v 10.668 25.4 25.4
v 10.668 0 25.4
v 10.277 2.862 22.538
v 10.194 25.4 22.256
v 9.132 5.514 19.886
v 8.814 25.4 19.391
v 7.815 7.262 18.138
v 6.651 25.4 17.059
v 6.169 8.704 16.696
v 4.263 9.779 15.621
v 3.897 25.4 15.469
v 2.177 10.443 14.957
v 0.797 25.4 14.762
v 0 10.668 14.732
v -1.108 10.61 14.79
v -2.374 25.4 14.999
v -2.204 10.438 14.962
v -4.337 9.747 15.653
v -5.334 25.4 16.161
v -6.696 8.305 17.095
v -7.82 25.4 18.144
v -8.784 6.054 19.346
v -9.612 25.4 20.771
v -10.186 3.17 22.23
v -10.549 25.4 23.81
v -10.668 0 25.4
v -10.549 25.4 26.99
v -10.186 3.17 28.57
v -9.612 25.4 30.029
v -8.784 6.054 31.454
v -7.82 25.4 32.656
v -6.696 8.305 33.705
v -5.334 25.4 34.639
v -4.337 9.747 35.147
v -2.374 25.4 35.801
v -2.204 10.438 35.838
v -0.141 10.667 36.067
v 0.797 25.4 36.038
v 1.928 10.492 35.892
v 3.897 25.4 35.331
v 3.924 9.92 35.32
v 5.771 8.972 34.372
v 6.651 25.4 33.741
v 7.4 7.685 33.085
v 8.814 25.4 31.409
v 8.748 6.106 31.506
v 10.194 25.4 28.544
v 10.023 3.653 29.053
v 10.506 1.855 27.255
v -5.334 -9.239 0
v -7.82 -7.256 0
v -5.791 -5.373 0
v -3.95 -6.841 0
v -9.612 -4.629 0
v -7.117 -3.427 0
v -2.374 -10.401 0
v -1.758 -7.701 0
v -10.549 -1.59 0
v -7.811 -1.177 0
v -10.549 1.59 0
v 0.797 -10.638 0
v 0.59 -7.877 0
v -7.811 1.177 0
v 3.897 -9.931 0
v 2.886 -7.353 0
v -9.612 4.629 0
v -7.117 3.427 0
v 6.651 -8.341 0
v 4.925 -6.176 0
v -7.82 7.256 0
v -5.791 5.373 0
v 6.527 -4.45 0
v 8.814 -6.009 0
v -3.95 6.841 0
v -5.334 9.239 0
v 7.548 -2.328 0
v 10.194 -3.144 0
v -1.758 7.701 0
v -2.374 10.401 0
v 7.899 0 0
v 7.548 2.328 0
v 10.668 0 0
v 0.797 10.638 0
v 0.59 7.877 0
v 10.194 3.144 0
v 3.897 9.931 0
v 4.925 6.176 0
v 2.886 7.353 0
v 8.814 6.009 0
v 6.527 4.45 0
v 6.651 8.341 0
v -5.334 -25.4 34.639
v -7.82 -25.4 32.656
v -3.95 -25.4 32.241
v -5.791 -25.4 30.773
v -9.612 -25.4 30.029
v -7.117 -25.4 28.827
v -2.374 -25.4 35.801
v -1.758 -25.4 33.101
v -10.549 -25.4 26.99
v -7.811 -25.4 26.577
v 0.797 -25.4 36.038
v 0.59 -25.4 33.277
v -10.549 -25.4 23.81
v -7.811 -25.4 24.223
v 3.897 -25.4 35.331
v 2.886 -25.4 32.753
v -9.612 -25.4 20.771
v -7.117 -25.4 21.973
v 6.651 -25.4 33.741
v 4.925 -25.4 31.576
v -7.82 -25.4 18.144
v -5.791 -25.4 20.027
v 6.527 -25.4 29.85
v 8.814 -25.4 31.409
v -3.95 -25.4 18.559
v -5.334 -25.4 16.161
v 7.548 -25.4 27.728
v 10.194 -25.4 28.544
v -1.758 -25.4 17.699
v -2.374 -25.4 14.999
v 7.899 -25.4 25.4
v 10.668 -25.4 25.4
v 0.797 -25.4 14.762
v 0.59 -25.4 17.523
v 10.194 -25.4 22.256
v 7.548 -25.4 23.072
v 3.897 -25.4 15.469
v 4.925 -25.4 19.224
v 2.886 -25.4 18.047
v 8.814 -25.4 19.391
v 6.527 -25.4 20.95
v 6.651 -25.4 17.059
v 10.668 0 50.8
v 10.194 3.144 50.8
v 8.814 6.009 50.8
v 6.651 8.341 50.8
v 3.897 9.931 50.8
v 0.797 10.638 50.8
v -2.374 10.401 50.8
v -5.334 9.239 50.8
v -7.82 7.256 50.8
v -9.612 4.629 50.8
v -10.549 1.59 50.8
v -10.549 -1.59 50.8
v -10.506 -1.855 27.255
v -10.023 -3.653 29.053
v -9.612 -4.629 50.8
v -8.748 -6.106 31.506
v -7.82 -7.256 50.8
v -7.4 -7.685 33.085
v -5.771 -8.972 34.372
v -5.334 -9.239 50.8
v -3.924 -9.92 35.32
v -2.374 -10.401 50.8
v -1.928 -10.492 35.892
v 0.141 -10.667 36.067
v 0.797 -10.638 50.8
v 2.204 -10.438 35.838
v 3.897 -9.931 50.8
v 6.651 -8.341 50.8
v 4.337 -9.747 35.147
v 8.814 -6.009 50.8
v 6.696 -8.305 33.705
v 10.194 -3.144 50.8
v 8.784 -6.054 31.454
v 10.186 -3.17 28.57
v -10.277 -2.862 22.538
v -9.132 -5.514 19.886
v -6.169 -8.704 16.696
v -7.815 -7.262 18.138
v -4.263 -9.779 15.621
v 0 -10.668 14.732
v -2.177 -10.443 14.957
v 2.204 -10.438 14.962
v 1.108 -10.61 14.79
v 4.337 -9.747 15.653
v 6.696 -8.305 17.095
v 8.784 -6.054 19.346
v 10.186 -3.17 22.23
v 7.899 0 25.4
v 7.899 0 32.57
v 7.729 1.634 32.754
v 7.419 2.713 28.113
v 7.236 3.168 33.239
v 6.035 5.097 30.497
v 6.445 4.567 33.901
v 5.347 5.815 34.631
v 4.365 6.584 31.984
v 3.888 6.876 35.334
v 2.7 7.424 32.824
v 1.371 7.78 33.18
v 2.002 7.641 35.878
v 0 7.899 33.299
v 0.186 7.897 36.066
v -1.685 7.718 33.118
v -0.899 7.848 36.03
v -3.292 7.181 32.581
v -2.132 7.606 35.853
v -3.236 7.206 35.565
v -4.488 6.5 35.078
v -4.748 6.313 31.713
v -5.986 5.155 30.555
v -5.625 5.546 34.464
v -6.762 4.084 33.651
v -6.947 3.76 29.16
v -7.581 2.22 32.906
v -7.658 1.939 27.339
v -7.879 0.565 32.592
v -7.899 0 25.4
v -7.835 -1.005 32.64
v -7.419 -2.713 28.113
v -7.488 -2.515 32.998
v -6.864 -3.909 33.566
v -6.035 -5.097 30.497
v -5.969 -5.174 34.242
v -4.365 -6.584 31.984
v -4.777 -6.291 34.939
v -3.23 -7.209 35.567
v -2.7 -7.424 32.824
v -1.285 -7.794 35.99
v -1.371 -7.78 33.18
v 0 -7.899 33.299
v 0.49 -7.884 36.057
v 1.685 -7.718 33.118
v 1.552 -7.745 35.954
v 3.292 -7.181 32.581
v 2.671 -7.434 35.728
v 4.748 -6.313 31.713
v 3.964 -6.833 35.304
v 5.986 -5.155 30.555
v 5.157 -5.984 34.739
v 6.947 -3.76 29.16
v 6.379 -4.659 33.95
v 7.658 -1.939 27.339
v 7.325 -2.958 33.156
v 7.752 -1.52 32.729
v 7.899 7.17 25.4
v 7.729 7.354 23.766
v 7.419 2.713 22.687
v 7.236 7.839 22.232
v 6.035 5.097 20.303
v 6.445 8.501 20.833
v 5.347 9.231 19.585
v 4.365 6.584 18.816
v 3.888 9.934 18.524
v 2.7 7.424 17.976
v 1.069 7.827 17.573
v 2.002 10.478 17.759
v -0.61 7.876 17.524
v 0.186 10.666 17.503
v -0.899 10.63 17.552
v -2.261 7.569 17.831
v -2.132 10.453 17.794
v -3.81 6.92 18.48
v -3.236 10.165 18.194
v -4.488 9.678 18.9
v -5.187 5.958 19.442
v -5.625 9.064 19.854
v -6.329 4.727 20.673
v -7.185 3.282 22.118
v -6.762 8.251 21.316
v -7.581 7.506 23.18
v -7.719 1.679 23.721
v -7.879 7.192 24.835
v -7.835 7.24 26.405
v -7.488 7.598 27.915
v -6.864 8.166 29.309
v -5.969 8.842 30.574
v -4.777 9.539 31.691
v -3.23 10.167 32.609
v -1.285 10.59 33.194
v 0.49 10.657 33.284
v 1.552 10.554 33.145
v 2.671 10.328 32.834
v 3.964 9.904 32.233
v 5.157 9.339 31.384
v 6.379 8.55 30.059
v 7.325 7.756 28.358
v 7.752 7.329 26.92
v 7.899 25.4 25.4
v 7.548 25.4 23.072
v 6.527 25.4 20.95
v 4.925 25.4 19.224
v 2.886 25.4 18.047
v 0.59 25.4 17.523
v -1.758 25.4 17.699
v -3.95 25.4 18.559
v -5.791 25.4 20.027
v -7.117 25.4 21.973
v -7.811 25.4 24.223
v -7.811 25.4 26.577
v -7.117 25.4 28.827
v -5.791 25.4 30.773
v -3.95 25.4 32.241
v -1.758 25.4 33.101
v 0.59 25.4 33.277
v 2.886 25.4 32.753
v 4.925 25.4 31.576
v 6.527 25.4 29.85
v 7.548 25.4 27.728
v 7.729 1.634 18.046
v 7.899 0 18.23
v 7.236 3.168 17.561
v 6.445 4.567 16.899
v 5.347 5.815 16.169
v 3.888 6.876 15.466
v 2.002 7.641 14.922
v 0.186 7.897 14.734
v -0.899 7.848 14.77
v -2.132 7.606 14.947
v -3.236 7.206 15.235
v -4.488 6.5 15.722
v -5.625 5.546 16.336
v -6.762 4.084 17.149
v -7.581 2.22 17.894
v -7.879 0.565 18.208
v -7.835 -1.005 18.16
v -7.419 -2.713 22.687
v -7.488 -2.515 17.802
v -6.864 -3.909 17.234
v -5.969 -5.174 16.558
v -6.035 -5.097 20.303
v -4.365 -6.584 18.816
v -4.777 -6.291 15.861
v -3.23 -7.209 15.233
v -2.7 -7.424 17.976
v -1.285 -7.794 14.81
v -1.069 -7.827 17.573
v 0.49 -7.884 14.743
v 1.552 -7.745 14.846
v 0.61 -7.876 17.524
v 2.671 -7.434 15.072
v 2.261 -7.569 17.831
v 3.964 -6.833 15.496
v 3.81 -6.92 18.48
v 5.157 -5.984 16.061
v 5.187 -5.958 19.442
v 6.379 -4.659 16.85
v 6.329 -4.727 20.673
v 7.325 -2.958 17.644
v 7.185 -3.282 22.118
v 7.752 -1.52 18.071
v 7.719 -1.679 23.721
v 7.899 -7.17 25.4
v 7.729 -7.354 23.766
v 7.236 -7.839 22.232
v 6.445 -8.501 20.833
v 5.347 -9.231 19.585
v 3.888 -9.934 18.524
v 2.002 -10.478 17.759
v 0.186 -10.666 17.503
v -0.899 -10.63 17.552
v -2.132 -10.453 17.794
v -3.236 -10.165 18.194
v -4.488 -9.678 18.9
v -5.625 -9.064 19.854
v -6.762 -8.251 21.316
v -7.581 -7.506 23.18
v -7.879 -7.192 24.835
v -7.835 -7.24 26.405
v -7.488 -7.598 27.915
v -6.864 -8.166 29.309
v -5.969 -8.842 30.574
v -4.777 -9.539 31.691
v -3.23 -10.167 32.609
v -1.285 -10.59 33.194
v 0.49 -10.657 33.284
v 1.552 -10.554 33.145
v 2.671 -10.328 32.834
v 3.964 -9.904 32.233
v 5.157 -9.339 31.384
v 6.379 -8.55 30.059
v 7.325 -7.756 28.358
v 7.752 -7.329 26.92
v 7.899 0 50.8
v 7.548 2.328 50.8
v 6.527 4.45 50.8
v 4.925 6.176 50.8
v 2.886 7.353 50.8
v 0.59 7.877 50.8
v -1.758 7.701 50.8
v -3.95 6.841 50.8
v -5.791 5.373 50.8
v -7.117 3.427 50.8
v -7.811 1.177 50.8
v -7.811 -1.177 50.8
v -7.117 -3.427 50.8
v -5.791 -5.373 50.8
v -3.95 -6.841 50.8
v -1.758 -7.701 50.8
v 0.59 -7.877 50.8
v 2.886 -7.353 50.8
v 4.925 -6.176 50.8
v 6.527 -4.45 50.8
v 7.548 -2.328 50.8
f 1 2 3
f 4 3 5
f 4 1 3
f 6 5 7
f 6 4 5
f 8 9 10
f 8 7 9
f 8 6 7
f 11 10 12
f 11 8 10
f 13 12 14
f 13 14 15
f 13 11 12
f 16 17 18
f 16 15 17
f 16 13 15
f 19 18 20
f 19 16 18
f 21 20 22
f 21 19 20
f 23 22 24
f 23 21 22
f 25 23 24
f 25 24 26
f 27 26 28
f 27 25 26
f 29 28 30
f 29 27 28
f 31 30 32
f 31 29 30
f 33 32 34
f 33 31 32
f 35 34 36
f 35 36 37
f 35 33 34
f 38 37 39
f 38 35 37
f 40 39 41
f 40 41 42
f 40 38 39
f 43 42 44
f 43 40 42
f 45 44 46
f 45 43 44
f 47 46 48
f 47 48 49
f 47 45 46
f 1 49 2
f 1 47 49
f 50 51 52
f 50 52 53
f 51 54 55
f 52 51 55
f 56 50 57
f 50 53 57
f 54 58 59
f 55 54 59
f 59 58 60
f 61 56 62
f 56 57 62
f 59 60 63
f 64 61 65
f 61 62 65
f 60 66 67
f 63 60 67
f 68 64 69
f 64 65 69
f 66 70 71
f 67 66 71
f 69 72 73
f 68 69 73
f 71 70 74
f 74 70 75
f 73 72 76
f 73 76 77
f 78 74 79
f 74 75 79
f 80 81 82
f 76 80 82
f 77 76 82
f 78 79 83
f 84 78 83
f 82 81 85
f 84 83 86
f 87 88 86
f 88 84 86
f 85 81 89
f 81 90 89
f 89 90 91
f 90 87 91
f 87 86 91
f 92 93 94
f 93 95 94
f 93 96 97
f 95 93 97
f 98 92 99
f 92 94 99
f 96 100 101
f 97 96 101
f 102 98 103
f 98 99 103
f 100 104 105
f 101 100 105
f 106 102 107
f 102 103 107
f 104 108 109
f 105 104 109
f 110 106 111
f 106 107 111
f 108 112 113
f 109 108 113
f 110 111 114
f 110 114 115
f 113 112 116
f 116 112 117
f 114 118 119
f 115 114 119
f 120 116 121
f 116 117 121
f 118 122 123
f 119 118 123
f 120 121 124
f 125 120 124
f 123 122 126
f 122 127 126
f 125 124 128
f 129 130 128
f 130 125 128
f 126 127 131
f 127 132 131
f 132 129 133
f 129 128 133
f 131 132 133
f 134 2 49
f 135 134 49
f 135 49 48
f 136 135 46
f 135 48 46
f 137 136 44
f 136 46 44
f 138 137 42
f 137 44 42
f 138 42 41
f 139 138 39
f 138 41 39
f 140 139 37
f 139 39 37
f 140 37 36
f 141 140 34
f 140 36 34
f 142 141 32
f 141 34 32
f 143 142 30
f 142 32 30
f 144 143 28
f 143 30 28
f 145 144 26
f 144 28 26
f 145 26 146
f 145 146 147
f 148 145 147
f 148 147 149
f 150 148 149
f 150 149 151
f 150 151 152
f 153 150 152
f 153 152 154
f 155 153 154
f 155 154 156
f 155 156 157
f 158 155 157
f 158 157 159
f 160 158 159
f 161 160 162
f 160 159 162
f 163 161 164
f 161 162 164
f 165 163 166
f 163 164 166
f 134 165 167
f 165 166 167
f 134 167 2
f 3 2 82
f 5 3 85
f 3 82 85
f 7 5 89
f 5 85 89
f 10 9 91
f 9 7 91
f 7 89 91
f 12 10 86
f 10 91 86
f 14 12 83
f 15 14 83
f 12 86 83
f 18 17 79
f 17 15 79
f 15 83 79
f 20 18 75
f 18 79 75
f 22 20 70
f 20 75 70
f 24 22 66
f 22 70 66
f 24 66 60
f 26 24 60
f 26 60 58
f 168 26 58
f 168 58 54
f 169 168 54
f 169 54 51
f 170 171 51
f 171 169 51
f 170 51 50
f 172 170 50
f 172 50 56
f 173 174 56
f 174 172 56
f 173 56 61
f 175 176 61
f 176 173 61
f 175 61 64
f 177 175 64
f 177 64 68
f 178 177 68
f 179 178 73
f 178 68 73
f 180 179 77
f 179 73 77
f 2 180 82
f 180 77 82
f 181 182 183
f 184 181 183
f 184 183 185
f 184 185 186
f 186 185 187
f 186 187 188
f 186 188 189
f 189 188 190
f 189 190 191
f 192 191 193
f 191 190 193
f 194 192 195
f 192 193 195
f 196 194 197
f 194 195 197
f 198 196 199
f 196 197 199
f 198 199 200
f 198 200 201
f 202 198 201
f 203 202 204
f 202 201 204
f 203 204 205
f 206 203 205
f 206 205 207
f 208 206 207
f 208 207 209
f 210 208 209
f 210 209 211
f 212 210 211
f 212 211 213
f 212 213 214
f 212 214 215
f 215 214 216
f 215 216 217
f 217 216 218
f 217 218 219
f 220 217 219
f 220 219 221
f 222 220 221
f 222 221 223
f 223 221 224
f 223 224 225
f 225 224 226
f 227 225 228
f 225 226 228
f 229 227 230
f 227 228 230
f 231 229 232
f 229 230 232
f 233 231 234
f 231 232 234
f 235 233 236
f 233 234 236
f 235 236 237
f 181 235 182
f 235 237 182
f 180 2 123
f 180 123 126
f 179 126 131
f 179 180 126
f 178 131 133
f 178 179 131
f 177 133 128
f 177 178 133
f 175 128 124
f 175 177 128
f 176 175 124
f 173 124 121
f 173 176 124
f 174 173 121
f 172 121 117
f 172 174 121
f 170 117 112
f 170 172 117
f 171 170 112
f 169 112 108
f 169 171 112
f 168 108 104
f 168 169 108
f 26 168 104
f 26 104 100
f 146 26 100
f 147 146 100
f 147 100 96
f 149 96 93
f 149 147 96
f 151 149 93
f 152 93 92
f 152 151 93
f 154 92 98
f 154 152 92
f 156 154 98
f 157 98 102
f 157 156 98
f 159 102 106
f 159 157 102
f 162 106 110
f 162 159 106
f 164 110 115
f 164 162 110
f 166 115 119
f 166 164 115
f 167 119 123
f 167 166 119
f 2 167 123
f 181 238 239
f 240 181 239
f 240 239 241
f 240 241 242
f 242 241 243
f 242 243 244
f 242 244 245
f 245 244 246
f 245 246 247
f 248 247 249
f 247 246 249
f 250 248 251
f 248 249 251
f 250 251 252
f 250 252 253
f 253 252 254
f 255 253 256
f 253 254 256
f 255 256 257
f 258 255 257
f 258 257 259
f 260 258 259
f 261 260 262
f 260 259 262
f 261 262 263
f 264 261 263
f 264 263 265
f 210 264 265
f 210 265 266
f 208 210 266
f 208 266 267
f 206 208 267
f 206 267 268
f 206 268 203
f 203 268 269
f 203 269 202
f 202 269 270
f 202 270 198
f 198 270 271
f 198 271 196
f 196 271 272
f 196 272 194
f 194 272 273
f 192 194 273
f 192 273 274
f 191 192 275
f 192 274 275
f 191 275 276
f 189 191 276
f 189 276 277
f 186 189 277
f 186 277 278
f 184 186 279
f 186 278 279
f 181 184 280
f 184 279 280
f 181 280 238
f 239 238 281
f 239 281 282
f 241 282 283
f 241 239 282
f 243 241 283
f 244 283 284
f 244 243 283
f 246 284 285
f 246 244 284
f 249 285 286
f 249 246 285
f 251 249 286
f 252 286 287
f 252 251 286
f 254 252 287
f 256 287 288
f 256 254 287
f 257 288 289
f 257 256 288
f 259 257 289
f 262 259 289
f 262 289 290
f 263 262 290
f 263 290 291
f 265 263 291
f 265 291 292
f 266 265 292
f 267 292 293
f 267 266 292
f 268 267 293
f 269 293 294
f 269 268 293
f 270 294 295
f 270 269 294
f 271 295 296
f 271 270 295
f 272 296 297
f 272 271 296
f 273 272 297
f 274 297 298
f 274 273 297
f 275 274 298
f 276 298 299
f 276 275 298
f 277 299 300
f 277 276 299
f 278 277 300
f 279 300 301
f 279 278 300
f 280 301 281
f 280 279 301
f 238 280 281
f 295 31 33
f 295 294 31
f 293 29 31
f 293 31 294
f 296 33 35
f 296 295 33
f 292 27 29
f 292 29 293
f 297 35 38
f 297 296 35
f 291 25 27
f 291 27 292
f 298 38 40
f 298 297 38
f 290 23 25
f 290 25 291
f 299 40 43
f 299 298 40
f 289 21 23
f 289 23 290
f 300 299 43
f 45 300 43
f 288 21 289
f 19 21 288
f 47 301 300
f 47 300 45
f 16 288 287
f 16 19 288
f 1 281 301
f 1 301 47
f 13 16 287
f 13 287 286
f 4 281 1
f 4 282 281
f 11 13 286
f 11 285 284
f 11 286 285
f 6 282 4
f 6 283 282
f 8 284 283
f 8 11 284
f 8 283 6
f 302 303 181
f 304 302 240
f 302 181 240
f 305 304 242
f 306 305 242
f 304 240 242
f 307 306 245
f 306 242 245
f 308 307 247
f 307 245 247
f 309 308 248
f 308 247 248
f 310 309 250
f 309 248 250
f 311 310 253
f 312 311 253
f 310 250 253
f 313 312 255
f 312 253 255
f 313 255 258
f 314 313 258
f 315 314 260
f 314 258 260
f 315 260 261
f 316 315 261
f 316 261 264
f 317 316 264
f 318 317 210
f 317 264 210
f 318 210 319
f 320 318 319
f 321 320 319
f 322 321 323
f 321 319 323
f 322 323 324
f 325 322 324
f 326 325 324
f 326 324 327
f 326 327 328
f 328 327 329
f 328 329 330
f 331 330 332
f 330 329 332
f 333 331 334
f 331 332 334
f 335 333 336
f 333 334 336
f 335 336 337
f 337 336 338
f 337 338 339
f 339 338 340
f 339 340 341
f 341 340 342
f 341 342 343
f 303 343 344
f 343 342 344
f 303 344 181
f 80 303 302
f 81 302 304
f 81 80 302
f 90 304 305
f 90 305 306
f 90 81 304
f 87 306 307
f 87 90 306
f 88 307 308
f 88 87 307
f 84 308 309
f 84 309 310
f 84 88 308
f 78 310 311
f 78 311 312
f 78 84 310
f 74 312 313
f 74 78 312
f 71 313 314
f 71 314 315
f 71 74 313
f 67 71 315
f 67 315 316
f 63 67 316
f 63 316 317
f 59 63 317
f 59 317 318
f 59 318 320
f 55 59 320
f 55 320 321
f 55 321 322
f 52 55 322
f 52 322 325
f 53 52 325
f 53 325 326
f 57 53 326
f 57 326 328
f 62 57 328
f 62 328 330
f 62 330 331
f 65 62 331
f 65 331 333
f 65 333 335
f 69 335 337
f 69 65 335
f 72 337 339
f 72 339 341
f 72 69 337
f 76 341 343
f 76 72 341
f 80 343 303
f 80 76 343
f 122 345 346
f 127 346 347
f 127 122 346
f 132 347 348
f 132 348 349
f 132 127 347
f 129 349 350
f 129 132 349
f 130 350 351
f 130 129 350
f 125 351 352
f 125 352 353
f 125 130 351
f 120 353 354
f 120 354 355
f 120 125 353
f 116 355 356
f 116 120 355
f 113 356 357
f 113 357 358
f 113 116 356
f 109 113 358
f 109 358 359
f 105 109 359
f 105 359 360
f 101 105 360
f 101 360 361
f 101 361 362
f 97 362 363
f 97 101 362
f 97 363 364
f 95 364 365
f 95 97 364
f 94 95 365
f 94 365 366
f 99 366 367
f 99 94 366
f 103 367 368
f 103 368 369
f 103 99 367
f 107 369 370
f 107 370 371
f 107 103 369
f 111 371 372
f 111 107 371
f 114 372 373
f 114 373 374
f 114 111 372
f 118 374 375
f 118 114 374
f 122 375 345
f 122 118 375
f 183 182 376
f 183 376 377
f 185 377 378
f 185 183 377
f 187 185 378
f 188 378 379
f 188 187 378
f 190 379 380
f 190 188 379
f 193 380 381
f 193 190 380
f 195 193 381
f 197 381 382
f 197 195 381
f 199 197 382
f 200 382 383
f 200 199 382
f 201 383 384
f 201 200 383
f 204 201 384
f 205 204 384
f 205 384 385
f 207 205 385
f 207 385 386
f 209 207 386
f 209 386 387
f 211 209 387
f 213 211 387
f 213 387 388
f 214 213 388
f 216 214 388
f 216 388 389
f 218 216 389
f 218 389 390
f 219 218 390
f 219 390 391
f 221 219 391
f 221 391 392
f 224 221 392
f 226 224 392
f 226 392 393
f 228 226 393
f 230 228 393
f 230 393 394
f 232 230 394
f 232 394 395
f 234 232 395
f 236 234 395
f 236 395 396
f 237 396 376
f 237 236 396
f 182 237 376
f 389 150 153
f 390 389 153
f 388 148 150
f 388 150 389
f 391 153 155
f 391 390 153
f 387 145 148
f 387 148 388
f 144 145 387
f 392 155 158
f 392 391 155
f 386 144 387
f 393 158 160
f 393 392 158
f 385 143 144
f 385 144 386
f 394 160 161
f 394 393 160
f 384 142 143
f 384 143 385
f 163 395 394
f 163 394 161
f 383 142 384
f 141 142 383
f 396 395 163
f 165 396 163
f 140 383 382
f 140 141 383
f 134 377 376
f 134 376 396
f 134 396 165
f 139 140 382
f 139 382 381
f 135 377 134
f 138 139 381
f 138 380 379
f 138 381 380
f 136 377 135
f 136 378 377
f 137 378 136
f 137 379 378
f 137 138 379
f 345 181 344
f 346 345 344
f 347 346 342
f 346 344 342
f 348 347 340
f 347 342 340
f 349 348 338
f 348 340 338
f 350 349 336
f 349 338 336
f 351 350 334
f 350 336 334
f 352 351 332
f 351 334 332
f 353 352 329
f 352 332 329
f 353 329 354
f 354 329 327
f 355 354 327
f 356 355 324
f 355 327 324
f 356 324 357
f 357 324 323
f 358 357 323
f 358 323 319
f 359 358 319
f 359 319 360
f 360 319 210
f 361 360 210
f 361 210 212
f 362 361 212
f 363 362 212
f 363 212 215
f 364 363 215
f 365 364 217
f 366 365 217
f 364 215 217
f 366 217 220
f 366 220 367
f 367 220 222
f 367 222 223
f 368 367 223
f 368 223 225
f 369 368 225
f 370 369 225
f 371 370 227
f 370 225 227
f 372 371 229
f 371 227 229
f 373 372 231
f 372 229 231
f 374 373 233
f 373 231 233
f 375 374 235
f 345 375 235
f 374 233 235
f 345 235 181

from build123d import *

# Parameters (mm, degrees)
SKETCH1_R               = 10.668
SKETCH1_R_2             = 7.8994
BOSS_EXTRUDE1_DEPTH     = 50.8
SKETCH2_R               = 10.668
SKETCH2_R_2             = 7.8994
BOSS_EXTRUDE2_DEPTH     = 25.4
SKETCH3_R               = 7.8994
CUT_EXTRUDE1_DEPTH      = 51.8000001
SKETCH4_R               = 7.8994
CUT_EXTRUDE2_DEPTH      = 1.0000001
CUT_EXTRUDE2_DEPTH_BACK = 51.8000001


with BuildPart() as part:
    # Sketch1 → Boss-Extrude1 (new body)
    with BuildSketch(Plane.XY):
        Circle(SKETCH1_R)
        Circle(SKETCH1_R_2, mode=Mode.SUBTRACT)
    extrude(amount=BOSS_EXTRUDE1_DEPTH)

    # Sketch2 → Boss-Extrude2 (add, symmetric)
    with BuildSketch(Plane(origin=(0, 0, 0), x_dir=(1, 0, 0), z_dir=(0, 1, 0))):
        with Locations((0, -25.4)):
            Circle(SKETCH2_R)
        with Locations((0, -25.4)):
            Circle(SKETCH2_R_2, mode=Mode.SUBTRACT)
    extrude(amount=BOSS_EXTRUDE2_DEPTH, both=True)

    # Sketch3 → Cut-Extrude1 (cut, through all)
    with BuildSketch(Plane.XY.offset(50.8)):
        Circle(SKETCH3_R)
    extrude(amount=-CUT_EXTRUDE1_DEPTH, mode=Mode.SUBTRACT)

    # Sketch4 → Cut-Extrude2 (cut, two sides)
    with BuildSketch(Plane(origin=(0, 25.4, 0), x_dir=(1, 0, 0), z_dir=(0, 1, 0))) as cut_extrude2_sk:
        with Locations((0, -25.4)):
            Circle(SKETCH4_R)
    extrude(amount=CUT_EXTRUDE2_DEPTH, mode=Mode.SUBTRACT)
    extrude(cut_extrude2_sk.sketch, amount=-CUT_EXTRUDE2_DEPTH_BACK, mode=Mode.SUBTRACT)


solid = part.part
